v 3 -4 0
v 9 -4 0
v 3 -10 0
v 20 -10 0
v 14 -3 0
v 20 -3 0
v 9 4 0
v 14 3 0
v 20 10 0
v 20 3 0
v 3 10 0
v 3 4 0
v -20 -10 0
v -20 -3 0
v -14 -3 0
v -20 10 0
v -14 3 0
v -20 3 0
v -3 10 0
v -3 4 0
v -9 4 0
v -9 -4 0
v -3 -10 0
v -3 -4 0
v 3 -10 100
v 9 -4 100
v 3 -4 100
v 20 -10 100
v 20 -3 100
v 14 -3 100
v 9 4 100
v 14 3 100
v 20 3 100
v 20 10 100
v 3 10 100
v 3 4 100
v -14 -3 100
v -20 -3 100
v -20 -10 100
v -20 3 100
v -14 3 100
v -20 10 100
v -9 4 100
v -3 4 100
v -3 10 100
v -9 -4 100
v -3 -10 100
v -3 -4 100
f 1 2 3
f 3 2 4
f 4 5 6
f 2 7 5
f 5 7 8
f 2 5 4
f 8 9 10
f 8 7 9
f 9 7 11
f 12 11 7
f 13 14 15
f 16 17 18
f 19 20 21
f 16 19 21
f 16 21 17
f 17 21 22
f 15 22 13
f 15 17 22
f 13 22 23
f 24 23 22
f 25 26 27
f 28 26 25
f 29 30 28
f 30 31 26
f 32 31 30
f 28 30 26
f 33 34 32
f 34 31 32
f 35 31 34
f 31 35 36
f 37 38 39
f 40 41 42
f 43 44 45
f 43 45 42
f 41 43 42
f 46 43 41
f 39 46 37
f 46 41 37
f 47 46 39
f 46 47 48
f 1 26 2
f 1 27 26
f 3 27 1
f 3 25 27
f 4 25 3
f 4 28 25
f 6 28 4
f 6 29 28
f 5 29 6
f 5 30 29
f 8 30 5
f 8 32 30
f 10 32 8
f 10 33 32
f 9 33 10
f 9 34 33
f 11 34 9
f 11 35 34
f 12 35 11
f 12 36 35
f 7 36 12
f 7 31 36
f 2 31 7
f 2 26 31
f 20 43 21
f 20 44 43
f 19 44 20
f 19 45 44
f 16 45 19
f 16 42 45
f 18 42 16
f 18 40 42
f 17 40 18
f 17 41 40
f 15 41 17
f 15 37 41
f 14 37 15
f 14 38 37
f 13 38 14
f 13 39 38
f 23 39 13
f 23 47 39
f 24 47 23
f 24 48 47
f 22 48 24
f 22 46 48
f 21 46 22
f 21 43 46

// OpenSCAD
$fn = 64;

length = 100;
w = 40;
h = 20;

slot_w = 6;
slot_depth = 6;

core_w = 18;
core_h = 8;

module extrusion2040(len=100) {
    linear_extrude(height=len, center=false, convexity=10)
        difference() {
            square([w, h], center=true);

            // Central core void (approximation)
            square([core_w, core_h], center=true);

            // T-slots (approximation) on all four sides
            // Left
            translate([-w/2 + slot_depth/2, 0])
                square([slot_depth, slot_w], center=true);

            // Right
            translate([ w/2 - slot_depth/2, 0])
                square([slot_depth, slot_w], center=true);

            // Bottom
            translate([0, -h/2 + slot_depth/2])
                square([slot_w, slot_depth], center=true);

            // Top
            translate([0,  h/2 - slot_depth/2])
                square([slot_w, slot_depth], center=true);
        }
}

extrusion2040(length);
